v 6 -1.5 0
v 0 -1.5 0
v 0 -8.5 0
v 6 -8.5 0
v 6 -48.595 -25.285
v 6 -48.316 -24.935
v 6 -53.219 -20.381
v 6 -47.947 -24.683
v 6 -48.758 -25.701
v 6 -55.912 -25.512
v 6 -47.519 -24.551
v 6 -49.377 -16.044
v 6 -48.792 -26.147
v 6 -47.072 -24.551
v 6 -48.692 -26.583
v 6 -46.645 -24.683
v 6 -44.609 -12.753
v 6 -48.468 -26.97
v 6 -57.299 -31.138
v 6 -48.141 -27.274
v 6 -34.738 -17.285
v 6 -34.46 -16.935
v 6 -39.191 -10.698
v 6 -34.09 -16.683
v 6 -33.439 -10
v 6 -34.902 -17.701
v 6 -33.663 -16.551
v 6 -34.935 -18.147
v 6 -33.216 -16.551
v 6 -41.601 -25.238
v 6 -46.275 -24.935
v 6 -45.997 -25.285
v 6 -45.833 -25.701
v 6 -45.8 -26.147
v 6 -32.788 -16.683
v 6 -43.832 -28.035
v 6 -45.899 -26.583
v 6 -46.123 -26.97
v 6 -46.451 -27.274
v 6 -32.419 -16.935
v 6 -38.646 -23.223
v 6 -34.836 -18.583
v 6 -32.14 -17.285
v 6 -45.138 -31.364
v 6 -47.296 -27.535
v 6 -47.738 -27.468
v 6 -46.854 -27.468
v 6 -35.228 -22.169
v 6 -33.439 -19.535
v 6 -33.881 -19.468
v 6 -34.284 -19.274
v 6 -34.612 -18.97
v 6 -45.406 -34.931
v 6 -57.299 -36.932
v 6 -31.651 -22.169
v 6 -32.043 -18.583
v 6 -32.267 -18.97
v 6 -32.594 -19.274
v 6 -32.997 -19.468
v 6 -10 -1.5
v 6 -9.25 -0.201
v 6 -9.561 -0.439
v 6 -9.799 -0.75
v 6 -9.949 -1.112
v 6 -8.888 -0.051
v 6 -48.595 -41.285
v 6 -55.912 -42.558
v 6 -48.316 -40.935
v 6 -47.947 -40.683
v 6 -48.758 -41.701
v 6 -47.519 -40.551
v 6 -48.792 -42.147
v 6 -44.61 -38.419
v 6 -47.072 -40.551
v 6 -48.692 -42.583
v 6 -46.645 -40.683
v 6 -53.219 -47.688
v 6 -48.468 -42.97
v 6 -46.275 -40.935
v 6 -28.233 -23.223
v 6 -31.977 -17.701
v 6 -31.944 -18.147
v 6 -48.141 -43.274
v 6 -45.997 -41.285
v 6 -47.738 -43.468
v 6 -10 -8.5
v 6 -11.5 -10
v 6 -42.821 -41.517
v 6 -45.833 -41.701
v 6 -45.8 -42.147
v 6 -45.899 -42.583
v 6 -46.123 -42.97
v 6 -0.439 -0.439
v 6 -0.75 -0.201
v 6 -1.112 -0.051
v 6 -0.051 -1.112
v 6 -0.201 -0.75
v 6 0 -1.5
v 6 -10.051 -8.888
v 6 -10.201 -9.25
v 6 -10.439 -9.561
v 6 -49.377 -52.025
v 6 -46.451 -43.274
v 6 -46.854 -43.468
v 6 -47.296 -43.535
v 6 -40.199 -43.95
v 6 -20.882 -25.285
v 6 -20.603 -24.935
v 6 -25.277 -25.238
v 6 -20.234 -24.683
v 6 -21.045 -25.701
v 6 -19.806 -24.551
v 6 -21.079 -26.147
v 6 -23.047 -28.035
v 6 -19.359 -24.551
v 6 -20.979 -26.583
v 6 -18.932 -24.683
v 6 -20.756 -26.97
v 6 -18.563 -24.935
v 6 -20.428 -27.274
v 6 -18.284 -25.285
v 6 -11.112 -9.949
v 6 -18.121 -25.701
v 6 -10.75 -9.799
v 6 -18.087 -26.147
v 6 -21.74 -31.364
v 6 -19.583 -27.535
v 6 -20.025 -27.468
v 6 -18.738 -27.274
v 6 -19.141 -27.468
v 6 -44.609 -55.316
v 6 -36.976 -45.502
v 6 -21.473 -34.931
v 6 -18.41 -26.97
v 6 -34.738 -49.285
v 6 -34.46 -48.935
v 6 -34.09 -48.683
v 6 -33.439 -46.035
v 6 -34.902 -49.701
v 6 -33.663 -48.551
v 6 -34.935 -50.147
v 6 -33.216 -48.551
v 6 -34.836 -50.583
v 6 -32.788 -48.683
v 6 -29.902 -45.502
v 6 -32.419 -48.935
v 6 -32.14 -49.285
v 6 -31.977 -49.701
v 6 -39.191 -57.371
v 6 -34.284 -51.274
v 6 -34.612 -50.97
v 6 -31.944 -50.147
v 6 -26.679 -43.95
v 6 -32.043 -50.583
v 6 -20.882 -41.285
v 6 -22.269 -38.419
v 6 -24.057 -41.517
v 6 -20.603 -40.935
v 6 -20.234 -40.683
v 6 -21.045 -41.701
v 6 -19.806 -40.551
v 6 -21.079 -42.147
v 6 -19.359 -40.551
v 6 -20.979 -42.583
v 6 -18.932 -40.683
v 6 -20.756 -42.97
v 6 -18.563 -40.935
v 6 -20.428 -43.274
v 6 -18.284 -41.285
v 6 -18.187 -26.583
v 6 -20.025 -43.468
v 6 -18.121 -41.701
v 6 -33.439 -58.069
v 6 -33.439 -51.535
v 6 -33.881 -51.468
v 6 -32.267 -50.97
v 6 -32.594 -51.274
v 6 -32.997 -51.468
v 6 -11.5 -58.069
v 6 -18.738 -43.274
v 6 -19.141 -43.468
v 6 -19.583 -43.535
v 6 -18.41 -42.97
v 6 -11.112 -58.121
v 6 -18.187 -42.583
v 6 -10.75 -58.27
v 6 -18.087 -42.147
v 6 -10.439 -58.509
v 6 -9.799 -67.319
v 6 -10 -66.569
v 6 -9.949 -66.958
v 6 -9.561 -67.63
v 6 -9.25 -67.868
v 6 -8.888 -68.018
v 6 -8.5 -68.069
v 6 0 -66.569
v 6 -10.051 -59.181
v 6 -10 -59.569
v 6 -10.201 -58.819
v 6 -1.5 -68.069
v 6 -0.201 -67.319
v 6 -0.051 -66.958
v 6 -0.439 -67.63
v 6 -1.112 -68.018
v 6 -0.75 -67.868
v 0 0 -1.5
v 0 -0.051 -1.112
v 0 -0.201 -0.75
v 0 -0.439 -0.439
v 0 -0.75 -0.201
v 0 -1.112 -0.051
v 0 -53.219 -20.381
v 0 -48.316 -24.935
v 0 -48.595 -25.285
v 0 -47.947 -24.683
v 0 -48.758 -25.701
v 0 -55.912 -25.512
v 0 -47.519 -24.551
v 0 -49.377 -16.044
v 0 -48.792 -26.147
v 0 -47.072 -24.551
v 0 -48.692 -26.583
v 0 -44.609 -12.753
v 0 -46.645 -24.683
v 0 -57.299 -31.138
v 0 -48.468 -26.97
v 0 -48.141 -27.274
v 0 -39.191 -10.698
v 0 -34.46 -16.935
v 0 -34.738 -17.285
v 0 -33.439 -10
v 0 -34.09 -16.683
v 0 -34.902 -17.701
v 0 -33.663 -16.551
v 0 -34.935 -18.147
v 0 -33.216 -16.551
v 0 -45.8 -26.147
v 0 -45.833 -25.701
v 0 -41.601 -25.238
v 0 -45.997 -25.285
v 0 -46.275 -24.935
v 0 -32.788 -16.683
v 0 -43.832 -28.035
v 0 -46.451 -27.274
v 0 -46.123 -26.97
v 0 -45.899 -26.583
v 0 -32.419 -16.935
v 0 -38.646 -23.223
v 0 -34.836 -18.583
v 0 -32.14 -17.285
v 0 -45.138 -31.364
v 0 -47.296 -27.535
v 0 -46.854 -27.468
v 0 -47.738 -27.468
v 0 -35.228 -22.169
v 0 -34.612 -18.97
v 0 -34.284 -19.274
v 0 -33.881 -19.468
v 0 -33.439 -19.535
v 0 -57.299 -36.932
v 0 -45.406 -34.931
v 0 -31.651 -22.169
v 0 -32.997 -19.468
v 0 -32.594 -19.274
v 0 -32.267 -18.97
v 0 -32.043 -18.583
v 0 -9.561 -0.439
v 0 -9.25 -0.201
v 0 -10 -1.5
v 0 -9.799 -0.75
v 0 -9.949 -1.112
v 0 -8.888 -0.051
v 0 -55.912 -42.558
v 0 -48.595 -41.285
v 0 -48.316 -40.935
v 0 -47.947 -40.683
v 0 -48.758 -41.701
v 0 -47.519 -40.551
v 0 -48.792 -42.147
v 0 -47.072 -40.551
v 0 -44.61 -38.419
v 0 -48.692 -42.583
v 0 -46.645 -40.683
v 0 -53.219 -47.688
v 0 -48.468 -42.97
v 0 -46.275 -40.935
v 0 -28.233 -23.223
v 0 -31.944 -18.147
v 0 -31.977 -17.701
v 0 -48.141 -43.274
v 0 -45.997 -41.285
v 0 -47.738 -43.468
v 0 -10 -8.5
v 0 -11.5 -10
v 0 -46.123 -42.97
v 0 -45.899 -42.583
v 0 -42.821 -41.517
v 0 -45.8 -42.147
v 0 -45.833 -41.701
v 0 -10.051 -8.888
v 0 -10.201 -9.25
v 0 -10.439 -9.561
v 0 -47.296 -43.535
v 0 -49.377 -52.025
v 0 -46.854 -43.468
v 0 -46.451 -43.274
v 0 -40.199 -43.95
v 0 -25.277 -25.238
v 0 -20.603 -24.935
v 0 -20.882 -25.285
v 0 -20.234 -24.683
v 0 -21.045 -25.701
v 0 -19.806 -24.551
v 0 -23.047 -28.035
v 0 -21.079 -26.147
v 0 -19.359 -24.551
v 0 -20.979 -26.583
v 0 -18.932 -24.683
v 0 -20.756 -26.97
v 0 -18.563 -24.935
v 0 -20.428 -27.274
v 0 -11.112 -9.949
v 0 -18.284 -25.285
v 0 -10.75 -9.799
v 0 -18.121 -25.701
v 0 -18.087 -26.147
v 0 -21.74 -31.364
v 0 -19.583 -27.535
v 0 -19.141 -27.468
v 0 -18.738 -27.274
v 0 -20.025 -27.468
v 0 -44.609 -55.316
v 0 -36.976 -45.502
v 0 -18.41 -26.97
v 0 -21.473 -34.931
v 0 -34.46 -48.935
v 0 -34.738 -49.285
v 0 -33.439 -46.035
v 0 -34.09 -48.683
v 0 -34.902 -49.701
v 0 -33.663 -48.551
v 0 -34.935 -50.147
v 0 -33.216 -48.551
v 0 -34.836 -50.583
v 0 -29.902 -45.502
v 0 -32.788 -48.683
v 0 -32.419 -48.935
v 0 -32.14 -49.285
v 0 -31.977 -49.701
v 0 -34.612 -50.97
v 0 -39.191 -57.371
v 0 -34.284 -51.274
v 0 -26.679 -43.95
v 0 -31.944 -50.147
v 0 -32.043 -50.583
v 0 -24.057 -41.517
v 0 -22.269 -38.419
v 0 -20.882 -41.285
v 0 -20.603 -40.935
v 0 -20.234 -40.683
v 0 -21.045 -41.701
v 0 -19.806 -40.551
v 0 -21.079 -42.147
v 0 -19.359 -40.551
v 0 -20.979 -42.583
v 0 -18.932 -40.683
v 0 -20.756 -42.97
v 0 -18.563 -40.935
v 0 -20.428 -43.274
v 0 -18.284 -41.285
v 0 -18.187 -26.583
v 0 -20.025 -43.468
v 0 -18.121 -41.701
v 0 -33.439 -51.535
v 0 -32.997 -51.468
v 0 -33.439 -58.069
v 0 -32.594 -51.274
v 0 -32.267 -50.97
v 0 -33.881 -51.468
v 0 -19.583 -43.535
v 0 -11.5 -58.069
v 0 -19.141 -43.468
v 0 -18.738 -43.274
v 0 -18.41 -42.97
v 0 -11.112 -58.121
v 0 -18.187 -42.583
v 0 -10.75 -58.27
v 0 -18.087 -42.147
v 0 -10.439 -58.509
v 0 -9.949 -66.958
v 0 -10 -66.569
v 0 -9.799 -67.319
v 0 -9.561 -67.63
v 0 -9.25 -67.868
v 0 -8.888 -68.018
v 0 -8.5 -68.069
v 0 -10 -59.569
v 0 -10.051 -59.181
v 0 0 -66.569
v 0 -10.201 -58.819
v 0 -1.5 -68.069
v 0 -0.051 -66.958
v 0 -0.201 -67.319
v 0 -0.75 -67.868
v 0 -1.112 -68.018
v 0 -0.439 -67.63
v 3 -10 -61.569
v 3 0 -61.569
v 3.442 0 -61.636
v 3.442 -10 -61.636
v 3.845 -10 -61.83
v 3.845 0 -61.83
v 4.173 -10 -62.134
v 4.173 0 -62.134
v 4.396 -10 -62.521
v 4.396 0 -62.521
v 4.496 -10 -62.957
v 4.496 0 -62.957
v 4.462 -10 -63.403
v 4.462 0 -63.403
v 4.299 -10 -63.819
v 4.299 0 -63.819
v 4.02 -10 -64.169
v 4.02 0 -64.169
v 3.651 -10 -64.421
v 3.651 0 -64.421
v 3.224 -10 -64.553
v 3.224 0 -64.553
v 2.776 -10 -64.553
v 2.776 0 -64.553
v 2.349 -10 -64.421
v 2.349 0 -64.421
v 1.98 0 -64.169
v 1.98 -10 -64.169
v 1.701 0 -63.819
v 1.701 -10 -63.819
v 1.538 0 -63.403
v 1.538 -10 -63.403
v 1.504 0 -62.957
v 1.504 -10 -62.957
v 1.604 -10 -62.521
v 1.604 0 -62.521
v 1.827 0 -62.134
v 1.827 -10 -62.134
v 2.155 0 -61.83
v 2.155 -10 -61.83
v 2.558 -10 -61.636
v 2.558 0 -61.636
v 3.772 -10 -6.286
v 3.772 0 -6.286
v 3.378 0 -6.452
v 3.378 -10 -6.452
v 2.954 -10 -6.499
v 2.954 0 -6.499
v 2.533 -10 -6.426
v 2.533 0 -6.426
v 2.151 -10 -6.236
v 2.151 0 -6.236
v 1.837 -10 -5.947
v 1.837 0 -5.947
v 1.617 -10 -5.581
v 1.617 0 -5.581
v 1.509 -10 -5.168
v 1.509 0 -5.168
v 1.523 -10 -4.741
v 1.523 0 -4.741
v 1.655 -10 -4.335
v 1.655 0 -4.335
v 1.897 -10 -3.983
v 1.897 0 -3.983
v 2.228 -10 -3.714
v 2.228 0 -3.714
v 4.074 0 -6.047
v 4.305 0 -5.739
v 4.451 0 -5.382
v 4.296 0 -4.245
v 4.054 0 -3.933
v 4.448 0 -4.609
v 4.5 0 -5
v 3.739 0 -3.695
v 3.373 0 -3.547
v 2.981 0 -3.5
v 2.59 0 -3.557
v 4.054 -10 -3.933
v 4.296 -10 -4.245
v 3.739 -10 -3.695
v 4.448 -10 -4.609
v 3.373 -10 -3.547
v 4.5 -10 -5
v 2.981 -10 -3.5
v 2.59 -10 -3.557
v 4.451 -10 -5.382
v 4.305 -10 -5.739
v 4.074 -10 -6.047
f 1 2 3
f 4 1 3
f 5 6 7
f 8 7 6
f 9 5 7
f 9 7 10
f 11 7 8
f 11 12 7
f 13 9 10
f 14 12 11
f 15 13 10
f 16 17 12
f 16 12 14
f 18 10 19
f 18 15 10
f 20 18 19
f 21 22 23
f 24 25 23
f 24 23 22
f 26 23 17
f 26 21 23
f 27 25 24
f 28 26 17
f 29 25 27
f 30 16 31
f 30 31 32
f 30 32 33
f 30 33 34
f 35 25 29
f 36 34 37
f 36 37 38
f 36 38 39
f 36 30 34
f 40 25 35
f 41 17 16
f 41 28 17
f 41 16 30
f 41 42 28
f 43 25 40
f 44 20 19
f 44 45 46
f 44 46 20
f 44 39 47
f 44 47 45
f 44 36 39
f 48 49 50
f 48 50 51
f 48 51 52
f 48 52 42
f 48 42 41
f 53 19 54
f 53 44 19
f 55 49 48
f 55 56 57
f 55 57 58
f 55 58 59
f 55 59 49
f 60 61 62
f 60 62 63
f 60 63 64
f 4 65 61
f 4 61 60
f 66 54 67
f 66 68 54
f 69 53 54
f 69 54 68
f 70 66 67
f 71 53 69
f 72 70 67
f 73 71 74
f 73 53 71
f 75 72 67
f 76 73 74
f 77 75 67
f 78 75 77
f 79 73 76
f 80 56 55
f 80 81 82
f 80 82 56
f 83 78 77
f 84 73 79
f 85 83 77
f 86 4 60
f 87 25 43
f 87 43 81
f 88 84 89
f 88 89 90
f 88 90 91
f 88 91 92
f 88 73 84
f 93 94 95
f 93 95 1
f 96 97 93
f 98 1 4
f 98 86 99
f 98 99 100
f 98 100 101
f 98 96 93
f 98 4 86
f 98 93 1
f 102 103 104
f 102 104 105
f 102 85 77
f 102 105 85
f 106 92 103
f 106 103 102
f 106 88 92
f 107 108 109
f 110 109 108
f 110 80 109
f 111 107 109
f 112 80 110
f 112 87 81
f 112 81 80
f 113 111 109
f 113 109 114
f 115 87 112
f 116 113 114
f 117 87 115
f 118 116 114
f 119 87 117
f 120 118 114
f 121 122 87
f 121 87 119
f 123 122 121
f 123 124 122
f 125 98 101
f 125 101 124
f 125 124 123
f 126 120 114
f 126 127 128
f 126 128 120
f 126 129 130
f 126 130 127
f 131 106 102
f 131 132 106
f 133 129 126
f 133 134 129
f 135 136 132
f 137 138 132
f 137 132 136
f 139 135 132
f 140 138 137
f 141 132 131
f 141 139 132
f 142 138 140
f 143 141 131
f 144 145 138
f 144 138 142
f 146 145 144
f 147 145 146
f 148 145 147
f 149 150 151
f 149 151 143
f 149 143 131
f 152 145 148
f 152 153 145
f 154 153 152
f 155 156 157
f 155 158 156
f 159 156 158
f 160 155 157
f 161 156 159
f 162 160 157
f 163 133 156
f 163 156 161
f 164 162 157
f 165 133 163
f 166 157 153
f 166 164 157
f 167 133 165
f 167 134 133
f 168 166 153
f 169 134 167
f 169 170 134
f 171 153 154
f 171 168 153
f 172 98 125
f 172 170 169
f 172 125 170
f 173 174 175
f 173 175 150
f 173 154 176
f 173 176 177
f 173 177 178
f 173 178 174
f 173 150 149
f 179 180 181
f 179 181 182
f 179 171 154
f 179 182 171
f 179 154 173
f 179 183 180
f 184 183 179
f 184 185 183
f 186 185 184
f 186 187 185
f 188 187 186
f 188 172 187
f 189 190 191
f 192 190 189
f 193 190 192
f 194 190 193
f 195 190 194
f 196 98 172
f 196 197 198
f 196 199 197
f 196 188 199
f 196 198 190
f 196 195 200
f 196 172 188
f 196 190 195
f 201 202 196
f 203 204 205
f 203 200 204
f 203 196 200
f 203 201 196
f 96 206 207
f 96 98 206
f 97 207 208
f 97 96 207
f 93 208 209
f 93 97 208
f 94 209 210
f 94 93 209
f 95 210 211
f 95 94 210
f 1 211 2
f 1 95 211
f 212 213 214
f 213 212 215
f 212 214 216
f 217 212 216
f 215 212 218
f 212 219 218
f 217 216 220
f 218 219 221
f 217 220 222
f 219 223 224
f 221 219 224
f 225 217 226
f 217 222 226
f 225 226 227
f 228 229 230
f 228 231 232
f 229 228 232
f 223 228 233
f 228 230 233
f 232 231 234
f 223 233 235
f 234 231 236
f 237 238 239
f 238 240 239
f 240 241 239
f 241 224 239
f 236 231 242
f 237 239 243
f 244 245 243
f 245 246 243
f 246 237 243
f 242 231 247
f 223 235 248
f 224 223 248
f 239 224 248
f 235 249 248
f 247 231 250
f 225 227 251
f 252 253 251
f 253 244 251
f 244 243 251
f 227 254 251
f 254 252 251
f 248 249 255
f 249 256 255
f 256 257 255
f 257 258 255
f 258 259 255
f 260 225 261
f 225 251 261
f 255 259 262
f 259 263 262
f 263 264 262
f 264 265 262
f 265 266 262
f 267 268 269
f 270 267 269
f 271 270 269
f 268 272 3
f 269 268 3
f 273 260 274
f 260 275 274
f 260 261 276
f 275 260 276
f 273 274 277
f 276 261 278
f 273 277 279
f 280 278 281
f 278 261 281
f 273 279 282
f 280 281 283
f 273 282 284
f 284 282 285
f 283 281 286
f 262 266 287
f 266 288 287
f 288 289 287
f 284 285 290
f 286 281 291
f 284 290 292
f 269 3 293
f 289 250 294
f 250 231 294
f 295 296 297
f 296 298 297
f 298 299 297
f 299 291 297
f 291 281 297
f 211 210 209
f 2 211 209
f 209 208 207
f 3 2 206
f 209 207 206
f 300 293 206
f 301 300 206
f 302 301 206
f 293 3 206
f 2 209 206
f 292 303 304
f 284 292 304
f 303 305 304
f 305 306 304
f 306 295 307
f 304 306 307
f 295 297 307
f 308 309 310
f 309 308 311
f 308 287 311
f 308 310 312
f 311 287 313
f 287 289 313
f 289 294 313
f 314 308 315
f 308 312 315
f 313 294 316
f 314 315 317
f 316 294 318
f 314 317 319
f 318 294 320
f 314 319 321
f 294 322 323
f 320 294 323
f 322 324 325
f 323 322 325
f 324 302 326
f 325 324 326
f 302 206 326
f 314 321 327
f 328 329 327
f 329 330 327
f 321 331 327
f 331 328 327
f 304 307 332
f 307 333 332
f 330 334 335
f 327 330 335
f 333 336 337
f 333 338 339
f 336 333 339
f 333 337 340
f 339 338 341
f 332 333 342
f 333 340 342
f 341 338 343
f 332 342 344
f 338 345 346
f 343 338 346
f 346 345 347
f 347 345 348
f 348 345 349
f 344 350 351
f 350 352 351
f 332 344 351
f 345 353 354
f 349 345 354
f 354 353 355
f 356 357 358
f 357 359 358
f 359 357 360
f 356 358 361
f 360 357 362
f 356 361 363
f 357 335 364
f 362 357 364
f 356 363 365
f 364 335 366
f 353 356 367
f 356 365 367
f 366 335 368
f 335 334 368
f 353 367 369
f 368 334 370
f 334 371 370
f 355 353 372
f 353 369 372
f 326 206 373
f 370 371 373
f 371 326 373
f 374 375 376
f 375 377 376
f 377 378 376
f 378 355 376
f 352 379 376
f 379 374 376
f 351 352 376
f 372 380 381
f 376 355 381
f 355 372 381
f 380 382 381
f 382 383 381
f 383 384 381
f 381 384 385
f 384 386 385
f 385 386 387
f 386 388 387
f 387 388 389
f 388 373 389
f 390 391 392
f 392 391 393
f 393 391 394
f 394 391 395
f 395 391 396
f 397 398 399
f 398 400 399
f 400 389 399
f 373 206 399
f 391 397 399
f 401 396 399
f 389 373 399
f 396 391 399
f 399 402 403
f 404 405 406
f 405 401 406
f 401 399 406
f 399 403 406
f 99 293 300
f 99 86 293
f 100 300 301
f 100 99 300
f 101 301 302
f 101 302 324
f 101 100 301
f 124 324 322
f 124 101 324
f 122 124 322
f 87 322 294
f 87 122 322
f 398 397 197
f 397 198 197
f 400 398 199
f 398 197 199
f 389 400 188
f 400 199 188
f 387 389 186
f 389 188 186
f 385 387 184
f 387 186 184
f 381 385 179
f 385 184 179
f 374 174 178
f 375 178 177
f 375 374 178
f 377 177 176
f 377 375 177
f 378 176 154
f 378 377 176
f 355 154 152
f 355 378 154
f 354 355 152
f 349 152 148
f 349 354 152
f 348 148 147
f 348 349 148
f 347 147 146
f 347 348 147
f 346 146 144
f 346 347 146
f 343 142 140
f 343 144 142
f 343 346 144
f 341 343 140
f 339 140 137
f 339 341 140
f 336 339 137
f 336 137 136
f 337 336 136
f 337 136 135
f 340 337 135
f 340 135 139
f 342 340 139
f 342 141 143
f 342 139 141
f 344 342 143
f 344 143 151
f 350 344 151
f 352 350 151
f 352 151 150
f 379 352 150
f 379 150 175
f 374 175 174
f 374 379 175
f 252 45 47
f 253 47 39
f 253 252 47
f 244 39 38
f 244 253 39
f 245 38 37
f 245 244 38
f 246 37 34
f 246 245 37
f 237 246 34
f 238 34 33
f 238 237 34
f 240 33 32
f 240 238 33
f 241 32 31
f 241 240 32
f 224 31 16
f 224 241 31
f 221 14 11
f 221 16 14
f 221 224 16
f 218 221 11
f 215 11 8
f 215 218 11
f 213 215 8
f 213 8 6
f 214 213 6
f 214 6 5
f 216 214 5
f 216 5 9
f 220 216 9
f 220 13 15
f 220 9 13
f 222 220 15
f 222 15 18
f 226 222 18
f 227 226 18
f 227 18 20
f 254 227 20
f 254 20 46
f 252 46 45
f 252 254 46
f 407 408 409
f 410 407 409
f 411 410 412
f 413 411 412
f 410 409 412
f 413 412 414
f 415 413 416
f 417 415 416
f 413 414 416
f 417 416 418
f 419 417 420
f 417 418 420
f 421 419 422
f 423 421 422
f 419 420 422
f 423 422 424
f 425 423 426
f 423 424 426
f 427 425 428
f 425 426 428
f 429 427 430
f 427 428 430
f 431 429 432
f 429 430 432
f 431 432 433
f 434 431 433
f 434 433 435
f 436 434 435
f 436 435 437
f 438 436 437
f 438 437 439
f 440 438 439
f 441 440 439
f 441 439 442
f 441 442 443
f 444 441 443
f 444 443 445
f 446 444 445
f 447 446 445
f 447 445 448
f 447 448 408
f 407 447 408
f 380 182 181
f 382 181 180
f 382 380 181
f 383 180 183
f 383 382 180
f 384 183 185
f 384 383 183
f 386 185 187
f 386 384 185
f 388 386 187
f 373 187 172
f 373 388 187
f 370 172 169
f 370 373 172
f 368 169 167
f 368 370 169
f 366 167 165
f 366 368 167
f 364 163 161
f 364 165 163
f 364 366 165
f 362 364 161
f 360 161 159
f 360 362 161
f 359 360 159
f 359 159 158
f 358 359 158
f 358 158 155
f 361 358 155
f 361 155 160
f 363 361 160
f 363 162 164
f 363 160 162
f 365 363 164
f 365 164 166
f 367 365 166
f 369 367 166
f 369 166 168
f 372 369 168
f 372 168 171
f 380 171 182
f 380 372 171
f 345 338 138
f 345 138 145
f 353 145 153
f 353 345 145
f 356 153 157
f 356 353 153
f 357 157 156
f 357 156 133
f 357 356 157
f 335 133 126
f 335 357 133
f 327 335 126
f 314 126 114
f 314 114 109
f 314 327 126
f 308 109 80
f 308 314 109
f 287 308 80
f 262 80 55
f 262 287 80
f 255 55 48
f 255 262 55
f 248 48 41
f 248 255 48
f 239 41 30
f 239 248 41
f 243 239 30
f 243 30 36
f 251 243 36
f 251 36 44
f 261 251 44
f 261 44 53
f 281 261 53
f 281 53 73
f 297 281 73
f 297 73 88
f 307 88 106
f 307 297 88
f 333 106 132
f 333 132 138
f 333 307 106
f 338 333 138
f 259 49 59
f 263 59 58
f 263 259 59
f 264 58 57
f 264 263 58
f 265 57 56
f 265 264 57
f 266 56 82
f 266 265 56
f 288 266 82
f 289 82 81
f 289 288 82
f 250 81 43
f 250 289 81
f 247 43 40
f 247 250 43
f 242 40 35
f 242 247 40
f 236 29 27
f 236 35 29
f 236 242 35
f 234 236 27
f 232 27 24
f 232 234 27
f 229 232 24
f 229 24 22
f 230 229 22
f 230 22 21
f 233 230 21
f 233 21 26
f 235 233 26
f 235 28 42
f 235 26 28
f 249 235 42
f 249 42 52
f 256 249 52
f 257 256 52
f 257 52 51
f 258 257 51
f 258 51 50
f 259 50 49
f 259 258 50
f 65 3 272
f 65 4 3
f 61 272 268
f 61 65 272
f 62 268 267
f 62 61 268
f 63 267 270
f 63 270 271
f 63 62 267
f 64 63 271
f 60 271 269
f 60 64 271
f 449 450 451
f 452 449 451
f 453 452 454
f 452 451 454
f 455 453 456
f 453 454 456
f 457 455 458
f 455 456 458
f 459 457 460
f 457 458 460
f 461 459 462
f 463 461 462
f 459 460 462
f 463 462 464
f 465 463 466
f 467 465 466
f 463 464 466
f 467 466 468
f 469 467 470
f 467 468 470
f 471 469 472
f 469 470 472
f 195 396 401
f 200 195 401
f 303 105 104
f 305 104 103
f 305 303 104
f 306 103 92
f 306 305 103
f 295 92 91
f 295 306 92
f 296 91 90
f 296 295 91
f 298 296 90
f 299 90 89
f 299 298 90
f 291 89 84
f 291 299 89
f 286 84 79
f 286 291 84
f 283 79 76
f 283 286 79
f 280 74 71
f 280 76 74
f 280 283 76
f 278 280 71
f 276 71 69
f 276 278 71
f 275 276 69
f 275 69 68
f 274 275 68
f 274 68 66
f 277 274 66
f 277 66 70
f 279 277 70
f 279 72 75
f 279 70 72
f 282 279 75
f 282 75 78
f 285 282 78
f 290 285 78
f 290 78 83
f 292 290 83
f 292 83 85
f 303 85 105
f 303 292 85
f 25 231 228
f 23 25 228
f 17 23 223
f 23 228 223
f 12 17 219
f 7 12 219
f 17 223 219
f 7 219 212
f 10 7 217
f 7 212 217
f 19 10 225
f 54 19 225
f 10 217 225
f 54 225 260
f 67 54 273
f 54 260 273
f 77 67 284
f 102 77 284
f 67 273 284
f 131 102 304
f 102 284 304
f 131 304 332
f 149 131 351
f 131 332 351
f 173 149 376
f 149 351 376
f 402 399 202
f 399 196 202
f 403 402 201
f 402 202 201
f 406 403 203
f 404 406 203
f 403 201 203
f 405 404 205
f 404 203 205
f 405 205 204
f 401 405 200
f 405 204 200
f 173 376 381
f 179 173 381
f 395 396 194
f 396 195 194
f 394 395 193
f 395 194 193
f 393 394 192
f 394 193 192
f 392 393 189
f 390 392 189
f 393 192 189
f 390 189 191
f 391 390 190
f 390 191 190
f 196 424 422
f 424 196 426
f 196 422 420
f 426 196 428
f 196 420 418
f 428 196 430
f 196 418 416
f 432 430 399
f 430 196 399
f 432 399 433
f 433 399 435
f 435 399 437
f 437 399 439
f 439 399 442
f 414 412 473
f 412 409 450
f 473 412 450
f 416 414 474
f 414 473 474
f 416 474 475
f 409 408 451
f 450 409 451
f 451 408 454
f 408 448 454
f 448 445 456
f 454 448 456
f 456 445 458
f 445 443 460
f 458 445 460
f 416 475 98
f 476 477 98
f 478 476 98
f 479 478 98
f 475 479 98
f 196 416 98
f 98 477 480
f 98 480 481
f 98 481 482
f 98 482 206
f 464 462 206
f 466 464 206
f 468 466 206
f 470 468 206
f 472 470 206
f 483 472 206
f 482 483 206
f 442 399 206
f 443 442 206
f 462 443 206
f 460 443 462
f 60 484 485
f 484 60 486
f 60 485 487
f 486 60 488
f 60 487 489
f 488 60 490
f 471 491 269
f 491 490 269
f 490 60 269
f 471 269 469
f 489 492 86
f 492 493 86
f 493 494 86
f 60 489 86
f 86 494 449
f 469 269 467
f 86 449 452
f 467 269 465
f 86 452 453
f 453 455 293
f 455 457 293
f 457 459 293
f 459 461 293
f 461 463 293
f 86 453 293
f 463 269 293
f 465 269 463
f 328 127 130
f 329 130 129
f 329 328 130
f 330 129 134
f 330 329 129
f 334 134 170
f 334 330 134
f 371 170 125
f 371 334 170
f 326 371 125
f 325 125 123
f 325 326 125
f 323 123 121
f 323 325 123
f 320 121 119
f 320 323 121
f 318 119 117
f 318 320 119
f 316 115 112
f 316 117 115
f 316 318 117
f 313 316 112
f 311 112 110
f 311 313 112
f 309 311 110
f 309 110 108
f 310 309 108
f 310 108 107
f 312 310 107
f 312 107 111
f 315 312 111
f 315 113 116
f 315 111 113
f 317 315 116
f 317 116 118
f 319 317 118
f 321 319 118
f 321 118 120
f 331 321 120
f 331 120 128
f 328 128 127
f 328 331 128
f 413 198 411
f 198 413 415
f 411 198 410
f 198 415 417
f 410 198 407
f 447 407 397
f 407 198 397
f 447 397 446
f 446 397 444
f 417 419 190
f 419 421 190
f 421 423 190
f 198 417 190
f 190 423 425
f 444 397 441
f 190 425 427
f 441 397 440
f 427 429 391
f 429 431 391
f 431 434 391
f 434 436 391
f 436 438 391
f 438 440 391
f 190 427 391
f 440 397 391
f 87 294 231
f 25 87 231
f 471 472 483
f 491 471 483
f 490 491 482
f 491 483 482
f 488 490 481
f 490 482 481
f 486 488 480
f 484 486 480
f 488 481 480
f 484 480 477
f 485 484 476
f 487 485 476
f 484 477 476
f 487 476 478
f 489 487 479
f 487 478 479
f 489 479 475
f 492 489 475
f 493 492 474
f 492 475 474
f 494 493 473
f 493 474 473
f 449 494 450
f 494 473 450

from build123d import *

# Parameters (mm, degrees)
SKETCH1_R           = 12
BOSS_EXTRUDE1_DEPTH = 6
CUT_EXTRUDE1_REACH  = 91.29
SKETCH2_R           = 1.5
CUT_EXTRUDE2_REACH  = 91.29
SKETCH3_R           = 1.5
FILLET1_R           = 1.5


with BuildPart() as part:
    # Sketch1 → Boss-Extrude1 (new body)
    with BuildSketch(Plane(origin=(0, 0, 0), x_dir=(0, 0, -1), z_dir=(1, 0, 0))):
        with BuildLine():
            Line((68.0694084, 0), (0, 0))
            Line((0, 0), (0, -10))
            Line((0, -10), (10, -10))
            Line((10, -10), (10, -33.439310345))
            ThreePointArc((10, -33.439310345), (34.0347042, -57.474014545), (58.0694084, -33.439310345))
            Line((58.0694084, -33.439310345), (58.0694084, -10))
            Line((58.0694084, -10), (68.0694084, -10))
            Line((68.0694084, -10), (68.0694084, 0))
        make_face()
        with Locations((34.0347042, -33.439310345)):
            Circle(SKETCH1_R, mode=Mode.SUBTRACT)
    extrude(amount=BOSS_EXTRUDE1_DEPTH)

    # Sketch2 → Cut-Extrude1 (cut, up to next)
    with BuildSketch(Plane(origin=(0, 0, 0), x_dir=(1, 0, 0), z_dir=(0, 1, 0)), mode=Mode.PRIVATE) as cut_extrude1_sk1:
        with Locations(Location((3, 63.0694084, 0), (0, 0, 270))):
            Circle(SKETCH2_R)
    cut_extrude1_tool1 = extrude(cut_extrude1_sk1.sketch, amount=-CUT_EXTRUDE1_REACH, mode=Mode.PRIVATE) & part.part
    # Sketch2 → Cut-Extrude1 (cut, up to next)
    with BuildSketch(Plane(origin=(0, 0, 0), x_dir=(1, 0, 0), z_dir=(0, 1, 0)), mode=Mode.PRIVATE) as cut_extrude1_sk2:
        with BuildLine():
            ThreePointArc((3.771743633, 6.286239389), (1.713760611, 5.771743633), (2.228256367, 3.713760611))
            Line((2.228256367, 3.713760611), (3.771743633, 6.286239389))
        make_face()
    cut_extrude1_tool2 = extrude(cut_extrude1_sk2.sketch, amount=-CUT_EXTRUDE1_REACH, mode=Mode.PRIVATE) & part.part
    # Sketch2 → Cut-Extrude1 (cut, up to next)
    with BuildSketch(Plane(origin=(0, 0, 0), x_dir=(1, 0, 0), z_dir=(0, 1, 0)), mode=Mode.PRIVATE) as cut_extrude1_sk3:
        with BuildLine():
            Line((3.771743633, 6.286239389), (2.228256367, 3.713760611))
            ThreePointArc((2.228256367, 3.713760611), (3.739048222, 3.69470014), (4.5, 5))
            ThreePointArc((4.5, 5), (4.30529986, 5.739048222), (3.771743633, 6.286239389))
        make_face()
    cut_extrude1_tool3 = extrude(cut_extrude1_sk3.sketch, amount=-CUT_EXTRUDE1_REACH, mode=Mode.PRIVATE) & part.part
    # Sketch2 → Cut-Extrude1 (cut, up to next)
    with BuildSketch(Plane(origin=(0, 0, 0), x_dir=(1, 0, 0), z_dir=(0, 1, 0)), mode=Mode.PRIVATE) as cut_extrude1_sk4:
        with BuildLine():
            ThreePointArc((3.771743633, 6.286239389), (1.713760611, 5.771743633), (2.228256367, 3.713760611))
            Line((2.228256367, 3.713760611), (3.771743633, 6.286239389))
        make_face()
    cut_extrude1_tool4 = extrude(cut_extrude1_sk4.sketch, amount=-CUT_EXTRUDE1_REACH, mode=Mode.PRIVATE) & part.part
    # Sketch2 → Cut-Extrude1 (cut, up to next)
    with BuildSketch(Plane(origin=(0, 0, 0), x_dir=(1, 0, 0), z_dir=(0, 1, 0)), mode=Mode.PRIVATE) as cut_extrude1_sk5:
        with BuildLine():
            Line((3.771743633, 6.286239389), (2.228256367, 3.713760611))
            ThreePointArc((2.228256367, 3.713760611), (3.739048222, 3.69470014), (4.5, 5))
            ThreePointArc((4.5, 5), (4.30529986, 5.739048222), (3.771743633, 6.286239389))
        make_face()
    cut_extrude1_tool5 = extrude(cut_extrude1_sk5.sketch, amount=-CUT_EXTRUDE1_REACH, mode=Mode.PRIVATE) & part.part
    add(cut_extrude1_tool1.solids().sort_by_distance((3, 0, -63.069408))[0], mode=Mode.SUBTRACT)
    add(cut_extrude1_tool2.solids().sort_by_distance((2.454103, 0, -5.327538))[0], mode=Mode.SUBTRACT)
    add(cut_extrude1_tool3.solids().sort_by_distance((3.545897, 0, -4.672462))[0], mode=Mode.SUBTRACT)
    add(cut_extrude1_tool4.solids().sort_by_distance((2.454103, 0, -5.327538))[0], mode=Mode.SUBTRACT)
    add(cut_extrude1_tool5.solids().sort_by_distance((3.545897, 0, -4.672462))[0], mode=Mode.SUBTRACT)

    # Sketch3 → Cut-Extrude2 (cut, up to next)
    with BuildSketch(Plane(origin=(0, 0, 0), x_dir=(0, 0, -1), z_dir=(1, 0, 0)), mode=Mode.PRIVATE) as cut_extrude2_sk1:
        with Locations((42.0347042, -47.295716805)):
            Circle(SKETCH3_R)
    cut_extrude2_tool1 = extrude(cut_extrude2_sk1.sketch, amount=CUT_EXTRUDE2_REACH, mode=Mode.PRIVATE) & part.part
    # Sketch3 → Cut-Extrude2 (cut, up to next)
    with BuildSketch(Plane(origin=(0, 0, 0), x_dir=(0, 0, -1), z_dir=(1, 0, 0)), mode=Mode.PRIVATE) as cut_extrude2_sk2:
        with Locations((50.0347042, -33.439310345)):
            Circle(SKETCH3_R)
    cut_extrude2_tool2 = extrude(cut_extrude2_sk2.sketch, amount=CUT_EXTRUDE2_REACH, mode=Mode.PRIVATE) & part.part
    # Sketch3 → Cut-Extrude2 (cut, up to next)
    with BuildSketch(Plane(origin=(0, 0, 0), x_dir=(0, 0, -1), z_dir=(1, 0, 0)), mode=Mode.PRIVATE) as cut_extrude2_sk3:
        with Locations((26.0347042, -19.582903884)):
            Circle(SKETCH3_R)
    cut_extrude2_tool3 = extrude(cut_extrude2_sk3.sketch, amount=CUT_EXTRUDE2_REACH, mode=Mode.PRIVATE) & part.part
    # Sketch3 → Cut-Extrude2 (cut, up to next)
    with BuildSketch(Plane(origin=(0, 0, 0), x_dir=(0, 0, -1), z_dir=(1, 0, 0)), mode=Mode.PRIVATE) as cut_extrude2_sk4:
        with Locations((18.0347042, -33.439310345)):
            Circle(SKETCH3_R)
    cut_extrude2_tool4 = extrude(cut_extrude2_sk4.sketch, amount=CUT_EXTRUDE2_REACH, mode=Mode.PRIVATE) & part.part
    # Sketch3 → Cut-Extrude2 (cut, up to next)
    with BuildSketch(Plane(origin=(0, 0, 0), x_dir=(0, 0, -1), z_dir=(1, 0, 0)), mode=Mode.PRIVATE) as cut_extrude2_sk5:
        with Locations((42.0347042, -19.582903884)):
            Circle(SKETCH3_R)
    cut_extrude2_tool5 = extrude(cut_extrude2_sk5.sketch, amount=CUT_EXTRUDE2_REACH, mode=Mode.PRIVATE) & part.part
    # Sketch3 → Cut-Extrude2 (cut, up to next)
    with BuildSketch(Plane(origin=(0, 0, 0), x_dir=(0, 0, -1), z_dir=(1, 0, 0)), mode=Mode.PRIVATE) as cut_extrude2_sk6:
        with Locations((26.0347042, -47.295716805)):
            Circle(SKETCH3_R)
    cut_extrude2_tool6 = extrude(cut_extrude2_sk6.sketch, amount=CUT_EXTRUDE2_REACH, mode=Mode.PRIVATE) & part.part
    add(cut_extrude2_tool1.solids().sort_by_distance((0, -47.295717, -42.034704))[0], mode=Mode.SUBTRACT)
    add(cut_extrude2_tool2.solids().sort_by_distance((0, -33.43931, -50.034704))[0], mode=Mode.SUBTRACT)
    add(cut_extrude2_tool3.solids().sort_by_distance((0, -19.582904, -26.034704))[0], mode=Mode.SUBTRACT)
    add(cut_extrude2_tool4.solids().sort_by_distance((0, -33.43931, -18.034704))[0], mode=Mode.SUBTRACT)
    add(cut_extrude2_tool5.solids().sort_by_distance((0, -19.582904, -42.034704))[0], mode=Mode.SUBTRACT)
    add(cut_extrude2_tool6.solids().sort_by_distance((0, -47.295717, -26.034704))[0], mode=Mode.SUBTRACT)

    # Fillet1
    fillet1_edges = [part.edges().sort_by_distance(p)[0] for p in [
        (3, 0, -68.0694084),
        (3, 0, 0),
        (3, -10, -68.0694084),
        (3, -10, 0),
        (3, -10, -58.0694084),
        (3, -10, -10),
    ]]
    fillet(fillet1_edges, radius=FILLET1_R)


solid = part.part
